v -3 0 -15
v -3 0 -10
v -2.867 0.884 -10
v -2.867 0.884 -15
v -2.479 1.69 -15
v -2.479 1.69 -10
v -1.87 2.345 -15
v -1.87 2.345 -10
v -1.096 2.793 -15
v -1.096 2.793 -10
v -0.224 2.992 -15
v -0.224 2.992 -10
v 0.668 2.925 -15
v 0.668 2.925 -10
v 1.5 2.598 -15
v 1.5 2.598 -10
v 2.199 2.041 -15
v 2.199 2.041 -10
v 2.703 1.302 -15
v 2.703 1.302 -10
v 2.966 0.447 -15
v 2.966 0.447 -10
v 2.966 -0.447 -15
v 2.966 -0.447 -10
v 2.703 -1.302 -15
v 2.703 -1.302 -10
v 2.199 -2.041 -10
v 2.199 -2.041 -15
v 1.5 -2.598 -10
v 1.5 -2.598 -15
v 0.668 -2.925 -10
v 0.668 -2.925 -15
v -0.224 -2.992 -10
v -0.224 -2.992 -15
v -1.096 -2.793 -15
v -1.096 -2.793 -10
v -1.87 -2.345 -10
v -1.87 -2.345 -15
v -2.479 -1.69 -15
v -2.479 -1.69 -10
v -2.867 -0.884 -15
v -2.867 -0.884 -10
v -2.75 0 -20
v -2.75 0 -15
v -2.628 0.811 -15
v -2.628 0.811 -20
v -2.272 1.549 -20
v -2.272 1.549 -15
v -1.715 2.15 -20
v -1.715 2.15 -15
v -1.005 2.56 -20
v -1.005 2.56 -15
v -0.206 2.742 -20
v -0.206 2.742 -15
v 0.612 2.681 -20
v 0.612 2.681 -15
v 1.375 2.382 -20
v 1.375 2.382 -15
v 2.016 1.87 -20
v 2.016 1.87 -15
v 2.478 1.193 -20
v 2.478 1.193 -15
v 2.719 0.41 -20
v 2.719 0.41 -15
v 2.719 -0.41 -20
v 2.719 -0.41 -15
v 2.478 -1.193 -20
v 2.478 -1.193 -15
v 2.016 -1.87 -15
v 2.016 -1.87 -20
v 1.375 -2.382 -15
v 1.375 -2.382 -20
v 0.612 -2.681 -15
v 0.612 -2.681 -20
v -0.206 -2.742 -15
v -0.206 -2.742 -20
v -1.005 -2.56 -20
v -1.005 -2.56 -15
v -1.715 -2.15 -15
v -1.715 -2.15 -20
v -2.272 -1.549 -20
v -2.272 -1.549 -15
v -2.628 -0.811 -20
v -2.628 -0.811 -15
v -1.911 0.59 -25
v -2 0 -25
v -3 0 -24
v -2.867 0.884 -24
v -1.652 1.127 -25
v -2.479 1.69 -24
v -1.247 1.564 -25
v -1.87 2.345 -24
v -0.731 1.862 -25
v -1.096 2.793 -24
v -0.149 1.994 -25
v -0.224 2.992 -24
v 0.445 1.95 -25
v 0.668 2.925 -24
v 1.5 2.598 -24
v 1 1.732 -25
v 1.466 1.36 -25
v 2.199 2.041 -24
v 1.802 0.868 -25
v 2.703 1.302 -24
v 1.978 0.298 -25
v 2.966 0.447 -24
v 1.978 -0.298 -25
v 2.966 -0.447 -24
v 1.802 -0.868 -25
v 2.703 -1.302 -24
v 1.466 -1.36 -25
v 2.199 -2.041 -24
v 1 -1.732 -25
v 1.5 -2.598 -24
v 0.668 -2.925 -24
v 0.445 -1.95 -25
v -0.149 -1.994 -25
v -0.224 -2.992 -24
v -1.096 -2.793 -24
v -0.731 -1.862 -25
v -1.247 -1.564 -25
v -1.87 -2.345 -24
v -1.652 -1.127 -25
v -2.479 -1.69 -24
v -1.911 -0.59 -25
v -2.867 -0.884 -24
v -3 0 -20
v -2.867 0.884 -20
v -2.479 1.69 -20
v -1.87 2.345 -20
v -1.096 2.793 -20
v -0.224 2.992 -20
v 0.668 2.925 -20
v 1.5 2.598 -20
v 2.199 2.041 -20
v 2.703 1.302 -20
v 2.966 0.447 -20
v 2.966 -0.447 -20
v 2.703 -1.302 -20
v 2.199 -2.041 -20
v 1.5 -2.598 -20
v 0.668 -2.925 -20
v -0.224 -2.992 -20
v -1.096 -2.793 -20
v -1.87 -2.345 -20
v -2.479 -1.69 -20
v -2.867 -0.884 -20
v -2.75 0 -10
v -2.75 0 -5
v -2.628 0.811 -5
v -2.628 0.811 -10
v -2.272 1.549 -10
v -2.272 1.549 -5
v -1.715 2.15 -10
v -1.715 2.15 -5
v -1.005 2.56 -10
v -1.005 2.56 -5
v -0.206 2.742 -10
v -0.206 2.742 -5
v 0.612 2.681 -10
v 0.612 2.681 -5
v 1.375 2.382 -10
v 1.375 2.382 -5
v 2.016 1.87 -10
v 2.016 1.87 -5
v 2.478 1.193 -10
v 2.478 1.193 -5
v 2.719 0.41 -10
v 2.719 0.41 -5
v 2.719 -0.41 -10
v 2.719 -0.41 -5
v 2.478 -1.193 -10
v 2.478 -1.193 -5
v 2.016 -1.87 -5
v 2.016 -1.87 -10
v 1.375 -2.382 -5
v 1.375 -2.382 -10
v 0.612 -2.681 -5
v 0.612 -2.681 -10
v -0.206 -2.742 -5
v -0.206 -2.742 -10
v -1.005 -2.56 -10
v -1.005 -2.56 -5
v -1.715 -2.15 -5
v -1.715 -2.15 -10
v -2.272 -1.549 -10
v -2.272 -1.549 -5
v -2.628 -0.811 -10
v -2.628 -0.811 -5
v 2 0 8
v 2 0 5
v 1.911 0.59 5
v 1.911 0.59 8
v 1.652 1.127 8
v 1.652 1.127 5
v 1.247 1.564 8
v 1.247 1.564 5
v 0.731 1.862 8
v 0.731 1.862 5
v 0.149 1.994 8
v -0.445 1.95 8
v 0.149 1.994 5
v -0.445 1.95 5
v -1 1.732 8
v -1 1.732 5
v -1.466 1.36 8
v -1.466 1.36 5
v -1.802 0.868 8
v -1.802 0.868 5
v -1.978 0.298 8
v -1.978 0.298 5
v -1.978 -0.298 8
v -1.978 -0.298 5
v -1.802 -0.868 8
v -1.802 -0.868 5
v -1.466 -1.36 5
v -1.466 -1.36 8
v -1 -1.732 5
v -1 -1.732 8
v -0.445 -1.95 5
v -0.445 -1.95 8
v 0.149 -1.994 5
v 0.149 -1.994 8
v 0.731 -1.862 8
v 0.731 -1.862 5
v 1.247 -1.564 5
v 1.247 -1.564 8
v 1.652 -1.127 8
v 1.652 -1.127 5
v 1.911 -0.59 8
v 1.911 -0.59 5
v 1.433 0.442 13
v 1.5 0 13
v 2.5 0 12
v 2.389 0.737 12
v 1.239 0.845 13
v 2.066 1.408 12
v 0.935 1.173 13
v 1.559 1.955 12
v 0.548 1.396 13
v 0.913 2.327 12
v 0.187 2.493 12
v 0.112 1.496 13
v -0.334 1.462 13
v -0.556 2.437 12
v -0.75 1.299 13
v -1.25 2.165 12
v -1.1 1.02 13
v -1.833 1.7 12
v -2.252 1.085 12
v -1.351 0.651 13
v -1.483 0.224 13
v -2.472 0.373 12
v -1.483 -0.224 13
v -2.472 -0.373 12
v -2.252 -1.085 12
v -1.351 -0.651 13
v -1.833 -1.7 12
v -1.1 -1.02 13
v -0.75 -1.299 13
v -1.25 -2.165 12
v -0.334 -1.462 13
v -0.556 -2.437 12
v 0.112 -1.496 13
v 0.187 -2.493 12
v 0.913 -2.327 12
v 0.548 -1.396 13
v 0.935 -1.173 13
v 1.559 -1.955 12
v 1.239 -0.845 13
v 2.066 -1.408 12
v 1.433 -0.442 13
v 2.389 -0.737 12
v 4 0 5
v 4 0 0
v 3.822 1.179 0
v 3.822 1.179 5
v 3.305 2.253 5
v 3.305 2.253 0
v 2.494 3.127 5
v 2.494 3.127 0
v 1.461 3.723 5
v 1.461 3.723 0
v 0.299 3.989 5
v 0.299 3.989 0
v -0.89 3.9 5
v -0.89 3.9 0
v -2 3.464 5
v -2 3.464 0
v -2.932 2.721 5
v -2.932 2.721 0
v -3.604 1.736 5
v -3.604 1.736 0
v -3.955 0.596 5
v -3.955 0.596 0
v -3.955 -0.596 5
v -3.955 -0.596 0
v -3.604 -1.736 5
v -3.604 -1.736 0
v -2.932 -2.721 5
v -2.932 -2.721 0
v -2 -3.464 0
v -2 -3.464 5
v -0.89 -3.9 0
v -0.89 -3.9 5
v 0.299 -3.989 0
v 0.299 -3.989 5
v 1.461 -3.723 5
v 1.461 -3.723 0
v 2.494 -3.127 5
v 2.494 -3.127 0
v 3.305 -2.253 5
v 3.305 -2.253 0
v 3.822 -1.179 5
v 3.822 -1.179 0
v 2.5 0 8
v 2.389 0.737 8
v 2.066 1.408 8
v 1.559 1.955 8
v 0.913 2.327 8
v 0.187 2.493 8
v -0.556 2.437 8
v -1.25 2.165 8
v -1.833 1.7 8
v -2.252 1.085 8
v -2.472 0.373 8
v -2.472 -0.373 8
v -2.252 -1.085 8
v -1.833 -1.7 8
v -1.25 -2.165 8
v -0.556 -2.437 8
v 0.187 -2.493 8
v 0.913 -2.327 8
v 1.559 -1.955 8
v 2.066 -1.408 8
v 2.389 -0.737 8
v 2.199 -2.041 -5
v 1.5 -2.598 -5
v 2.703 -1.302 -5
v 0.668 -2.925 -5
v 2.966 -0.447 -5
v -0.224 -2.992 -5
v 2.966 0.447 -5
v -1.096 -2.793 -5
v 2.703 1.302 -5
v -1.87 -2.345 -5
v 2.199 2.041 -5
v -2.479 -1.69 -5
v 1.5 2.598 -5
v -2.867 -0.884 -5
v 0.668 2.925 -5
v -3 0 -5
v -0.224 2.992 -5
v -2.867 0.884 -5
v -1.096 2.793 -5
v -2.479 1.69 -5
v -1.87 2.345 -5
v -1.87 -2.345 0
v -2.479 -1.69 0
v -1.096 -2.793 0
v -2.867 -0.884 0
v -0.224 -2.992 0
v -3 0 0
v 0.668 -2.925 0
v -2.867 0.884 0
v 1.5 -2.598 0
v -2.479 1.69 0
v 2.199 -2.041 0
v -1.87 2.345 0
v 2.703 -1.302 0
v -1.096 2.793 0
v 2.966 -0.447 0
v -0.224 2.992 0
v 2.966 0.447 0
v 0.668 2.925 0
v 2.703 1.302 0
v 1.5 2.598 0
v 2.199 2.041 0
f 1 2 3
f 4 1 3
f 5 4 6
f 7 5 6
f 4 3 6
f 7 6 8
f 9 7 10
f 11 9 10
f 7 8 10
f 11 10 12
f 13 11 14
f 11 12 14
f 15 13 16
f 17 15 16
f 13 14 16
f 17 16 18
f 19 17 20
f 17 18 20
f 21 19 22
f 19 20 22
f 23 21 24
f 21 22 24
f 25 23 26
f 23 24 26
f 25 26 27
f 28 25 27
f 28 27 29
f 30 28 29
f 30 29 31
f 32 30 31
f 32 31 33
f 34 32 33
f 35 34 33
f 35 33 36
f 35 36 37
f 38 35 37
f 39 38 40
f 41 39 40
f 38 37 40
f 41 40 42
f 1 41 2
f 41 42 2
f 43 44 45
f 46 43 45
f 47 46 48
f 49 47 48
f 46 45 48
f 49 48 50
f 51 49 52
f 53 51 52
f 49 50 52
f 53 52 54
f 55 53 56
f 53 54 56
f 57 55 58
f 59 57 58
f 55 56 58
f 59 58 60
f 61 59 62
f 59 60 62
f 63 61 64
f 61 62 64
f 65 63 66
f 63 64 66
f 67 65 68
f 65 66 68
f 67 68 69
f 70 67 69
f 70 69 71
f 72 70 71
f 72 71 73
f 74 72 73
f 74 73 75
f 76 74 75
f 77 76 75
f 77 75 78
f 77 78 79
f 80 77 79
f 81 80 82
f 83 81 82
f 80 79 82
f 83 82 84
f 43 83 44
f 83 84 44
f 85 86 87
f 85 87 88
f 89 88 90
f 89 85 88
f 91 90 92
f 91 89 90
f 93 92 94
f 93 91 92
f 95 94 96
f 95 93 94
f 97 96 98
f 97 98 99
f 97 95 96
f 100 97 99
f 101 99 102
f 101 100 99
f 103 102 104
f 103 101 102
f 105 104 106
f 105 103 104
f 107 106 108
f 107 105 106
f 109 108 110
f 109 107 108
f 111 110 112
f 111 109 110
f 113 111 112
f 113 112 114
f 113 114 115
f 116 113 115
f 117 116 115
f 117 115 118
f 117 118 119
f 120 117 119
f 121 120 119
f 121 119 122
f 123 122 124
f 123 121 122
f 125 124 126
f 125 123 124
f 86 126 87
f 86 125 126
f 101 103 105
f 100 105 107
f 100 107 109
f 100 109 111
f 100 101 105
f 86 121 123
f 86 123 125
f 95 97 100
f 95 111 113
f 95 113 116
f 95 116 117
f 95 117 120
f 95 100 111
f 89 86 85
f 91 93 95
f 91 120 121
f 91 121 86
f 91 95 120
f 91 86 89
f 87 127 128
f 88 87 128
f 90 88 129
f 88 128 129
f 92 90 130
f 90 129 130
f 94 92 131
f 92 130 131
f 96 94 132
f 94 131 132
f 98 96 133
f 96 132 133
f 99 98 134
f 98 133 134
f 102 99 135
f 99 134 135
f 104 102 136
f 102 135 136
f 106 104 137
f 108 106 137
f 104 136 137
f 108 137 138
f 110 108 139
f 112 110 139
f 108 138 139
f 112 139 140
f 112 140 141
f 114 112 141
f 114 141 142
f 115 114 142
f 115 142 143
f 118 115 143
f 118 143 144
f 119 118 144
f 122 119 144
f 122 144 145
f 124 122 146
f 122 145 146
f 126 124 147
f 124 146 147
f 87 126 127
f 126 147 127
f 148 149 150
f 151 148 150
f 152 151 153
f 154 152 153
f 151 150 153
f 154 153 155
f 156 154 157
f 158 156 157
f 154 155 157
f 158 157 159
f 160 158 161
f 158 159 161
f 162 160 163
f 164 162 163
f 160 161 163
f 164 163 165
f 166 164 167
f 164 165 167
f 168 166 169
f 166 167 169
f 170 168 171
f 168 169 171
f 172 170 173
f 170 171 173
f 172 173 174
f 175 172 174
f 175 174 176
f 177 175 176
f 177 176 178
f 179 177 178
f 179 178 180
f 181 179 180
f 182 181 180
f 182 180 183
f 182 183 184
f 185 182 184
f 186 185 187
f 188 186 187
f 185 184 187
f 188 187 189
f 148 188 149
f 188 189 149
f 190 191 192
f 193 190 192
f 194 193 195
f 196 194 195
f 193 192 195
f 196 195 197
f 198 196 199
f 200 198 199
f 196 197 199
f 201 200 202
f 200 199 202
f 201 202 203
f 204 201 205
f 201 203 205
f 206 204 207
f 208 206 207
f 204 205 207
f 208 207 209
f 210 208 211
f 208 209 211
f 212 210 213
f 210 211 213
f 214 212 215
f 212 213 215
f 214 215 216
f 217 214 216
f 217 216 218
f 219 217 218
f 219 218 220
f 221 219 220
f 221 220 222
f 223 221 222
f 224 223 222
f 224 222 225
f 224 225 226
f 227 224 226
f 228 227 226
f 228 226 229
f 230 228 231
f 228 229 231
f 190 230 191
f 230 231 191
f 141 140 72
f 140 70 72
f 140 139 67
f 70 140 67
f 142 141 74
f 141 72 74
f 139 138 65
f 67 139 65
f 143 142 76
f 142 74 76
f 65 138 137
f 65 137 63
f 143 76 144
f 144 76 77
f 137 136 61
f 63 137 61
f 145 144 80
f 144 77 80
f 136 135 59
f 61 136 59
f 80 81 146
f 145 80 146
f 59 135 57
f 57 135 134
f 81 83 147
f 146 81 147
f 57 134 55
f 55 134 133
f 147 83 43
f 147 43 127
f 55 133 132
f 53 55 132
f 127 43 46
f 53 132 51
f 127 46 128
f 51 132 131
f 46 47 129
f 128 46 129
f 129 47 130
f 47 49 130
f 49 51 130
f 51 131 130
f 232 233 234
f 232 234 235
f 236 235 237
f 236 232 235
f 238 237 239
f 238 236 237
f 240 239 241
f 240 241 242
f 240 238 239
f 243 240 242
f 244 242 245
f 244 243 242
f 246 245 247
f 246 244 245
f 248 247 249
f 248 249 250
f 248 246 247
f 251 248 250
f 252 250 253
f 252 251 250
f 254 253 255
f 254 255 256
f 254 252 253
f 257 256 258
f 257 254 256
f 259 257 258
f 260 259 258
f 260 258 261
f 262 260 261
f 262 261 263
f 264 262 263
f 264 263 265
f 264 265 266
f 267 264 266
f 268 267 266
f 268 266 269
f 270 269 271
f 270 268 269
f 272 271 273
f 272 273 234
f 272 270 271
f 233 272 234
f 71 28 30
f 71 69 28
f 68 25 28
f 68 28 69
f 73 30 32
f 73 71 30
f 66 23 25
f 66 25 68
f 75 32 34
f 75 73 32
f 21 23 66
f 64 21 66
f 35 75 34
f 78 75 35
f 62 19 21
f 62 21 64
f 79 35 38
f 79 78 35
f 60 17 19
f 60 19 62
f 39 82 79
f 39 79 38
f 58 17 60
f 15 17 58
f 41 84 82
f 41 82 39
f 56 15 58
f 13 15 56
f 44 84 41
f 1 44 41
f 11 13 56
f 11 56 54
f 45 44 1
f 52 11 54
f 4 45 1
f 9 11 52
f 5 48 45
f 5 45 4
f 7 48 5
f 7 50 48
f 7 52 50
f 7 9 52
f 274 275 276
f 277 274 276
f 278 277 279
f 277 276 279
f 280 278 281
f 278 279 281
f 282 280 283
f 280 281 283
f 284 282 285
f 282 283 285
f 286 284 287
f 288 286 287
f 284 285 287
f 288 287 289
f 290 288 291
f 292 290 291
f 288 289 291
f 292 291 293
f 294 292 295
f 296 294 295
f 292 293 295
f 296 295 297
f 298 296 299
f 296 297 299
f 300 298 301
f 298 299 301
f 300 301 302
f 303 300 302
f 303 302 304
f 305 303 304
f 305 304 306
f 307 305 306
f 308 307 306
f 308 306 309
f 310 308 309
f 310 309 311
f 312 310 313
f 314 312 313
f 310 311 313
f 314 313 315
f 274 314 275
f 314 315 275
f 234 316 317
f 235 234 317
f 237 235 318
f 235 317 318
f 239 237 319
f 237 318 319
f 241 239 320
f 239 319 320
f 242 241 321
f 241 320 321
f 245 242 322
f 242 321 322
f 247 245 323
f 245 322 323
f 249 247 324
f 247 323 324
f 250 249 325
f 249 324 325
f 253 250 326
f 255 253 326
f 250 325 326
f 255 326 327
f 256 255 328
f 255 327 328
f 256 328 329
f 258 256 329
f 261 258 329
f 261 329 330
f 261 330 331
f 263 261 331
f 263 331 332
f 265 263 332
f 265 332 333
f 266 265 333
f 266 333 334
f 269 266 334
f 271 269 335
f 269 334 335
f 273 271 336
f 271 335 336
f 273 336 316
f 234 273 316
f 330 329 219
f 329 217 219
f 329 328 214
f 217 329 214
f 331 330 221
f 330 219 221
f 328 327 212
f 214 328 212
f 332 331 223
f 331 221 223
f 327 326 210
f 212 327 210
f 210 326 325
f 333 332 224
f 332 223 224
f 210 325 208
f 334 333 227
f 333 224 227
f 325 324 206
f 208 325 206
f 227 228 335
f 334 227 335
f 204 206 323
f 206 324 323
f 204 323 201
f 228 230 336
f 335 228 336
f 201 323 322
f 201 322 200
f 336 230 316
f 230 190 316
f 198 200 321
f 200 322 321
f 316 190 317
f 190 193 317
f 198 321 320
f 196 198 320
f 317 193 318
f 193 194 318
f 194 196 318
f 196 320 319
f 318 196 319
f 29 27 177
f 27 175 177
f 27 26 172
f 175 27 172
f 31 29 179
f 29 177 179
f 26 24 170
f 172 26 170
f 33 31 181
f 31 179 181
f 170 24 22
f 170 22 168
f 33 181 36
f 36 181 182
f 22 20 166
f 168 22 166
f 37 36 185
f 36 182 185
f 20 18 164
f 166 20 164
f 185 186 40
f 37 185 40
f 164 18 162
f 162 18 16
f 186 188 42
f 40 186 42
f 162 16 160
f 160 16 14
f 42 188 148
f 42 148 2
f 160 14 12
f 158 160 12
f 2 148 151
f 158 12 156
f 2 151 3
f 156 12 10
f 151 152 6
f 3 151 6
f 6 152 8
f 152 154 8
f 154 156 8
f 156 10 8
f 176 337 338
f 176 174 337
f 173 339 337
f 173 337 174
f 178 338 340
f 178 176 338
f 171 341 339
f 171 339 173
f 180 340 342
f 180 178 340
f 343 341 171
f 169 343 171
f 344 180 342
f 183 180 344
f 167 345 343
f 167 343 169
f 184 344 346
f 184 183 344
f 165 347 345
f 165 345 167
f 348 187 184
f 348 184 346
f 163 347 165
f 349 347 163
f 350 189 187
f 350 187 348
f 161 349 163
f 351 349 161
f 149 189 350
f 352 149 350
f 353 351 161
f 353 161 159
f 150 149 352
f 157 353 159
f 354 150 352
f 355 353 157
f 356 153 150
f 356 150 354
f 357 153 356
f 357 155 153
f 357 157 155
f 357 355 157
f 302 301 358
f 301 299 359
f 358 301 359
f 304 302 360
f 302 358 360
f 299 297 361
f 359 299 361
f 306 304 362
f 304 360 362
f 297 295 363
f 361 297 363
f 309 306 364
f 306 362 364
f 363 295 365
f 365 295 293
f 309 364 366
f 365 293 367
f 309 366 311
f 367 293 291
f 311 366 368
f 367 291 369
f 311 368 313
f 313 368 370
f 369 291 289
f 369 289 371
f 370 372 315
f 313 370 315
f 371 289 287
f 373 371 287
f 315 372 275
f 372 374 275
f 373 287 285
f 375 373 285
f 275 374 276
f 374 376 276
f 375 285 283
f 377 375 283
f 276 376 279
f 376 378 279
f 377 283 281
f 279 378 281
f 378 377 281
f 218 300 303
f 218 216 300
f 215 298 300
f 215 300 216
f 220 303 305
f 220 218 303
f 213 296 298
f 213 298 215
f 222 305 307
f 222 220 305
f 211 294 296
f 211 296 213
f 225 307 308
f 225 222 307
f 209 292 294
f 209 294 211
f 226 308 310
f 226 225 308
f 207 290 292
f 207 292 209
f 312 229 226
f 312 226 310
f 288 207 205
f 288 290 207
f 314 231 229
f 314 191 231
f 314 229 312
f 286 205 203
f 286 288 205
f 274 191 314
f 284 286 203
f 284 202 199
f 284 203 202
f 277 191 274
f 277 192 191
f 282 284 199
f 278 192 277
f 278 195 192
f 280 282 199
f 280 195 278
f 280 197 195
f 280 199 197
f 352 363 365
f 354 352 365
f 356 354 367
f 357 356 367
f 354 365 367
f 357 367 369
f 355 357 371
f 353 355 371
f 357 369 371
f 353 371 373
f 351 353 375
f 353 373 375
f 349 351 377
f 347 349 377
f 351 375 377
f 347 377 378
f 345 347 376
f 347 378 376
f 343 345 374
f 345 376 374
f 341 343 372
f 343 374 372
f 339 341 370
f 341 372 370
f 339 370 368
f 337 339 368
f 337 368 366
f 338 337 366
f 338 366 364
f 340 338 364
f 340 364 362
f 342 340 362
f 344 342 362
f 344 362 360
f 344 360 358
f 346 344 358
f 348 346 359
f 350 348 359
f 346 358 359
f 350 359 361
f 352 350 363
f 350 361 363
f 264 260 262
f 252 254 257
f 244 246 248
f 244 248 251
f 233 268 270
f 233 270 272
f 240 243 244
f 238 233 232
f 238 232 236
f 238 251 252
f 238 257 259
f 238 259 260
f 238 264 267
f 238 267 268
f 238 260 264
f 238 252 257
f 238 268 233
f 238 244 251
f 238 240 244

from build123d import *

# Parameters (mm, degrees)
ESQUISSE1_R         = 4
BOSS_EXTRU_1_DEPTH  = 5
ESQUISSE5_R         = 3
BOSS_EXTRU_5_DEPTH  = 5
ESQUISSE6_R         = 2.75
BOSS_EXTRU_6_DEPTH  = 5
ESQUISSE7_R         = 3
BOSS_EXTRU_7_DEPTH  = 5
ESQUISSE8_R         = 2.75
BOSS_EXTRU_8_DEPTH  = 5
ESQUISSE9_R         = 3
BOSS_EXTRU_9_DEPTH  = 5
CHANFREIN1_SIZE     = 1
ESQUISSE10_R        = 2
BOSS_EXTRU_10_DEPTH = 3
ESQUISSE11_R        = 2.5
BOSS_EXTRU_11_DEPTH = 5
CHANFREIN2_SIZE     = 1


with BuildPart() as part:
    # Esquisse1 → Boss.-Extru.1 (new body)
    with BuildSketch(Plane.XY):
        Circle(ESQUISSE1_R)
    extrude(amount=BOSS_EXTRU_1_DEPTH)

    # Esquisse5 → Boss.-Extru.5 (add)
    with BuildSketch(Plane(origin=(0, 0, 0), x_dir=(-1, 0, 0), z_dir=(0, 0, -1))):
        Circle(ESQUISSE5_R)
    extrude(amount=BOSS_EXTRU_5_DEPTH)

    # Esquisse6 → Boss.-Extru.6 (add)
    with BuildSketch(Plane(origin=(0, 0, -5), x_dir=(-1, 0, 0), z_dir=(0, 0, -1))):
        Circle(ESQUISSE6_R)
    extrude(amount=BOSS_EXTRU_6_DEPTH)

    # Esquisse7 → Boss.-Extru.7 (add)
    with BuildSketch(Plane(origin=(0, 0, -10), x_dir=(-1, 0, 0), z_dir=(0, 0, -1))):
        Circle(ESQUISSE7_R)
    extrude(amount=BOSS_EXTRU_7_DEPTH)

    # Esquisse8 → Boss.-Extru.8 (add)
    with BuildSketch(Plane(origin=(0, 0, -15), x_dir=(-1, 0, 0), z_dir=(0, 0, -1))):
        Circle(ESQUISSE8_R)
    extrude(amount=BOSS_EXTRU_8_DEPTH)

    # Esquisse9 → Boss.-Extru.9 (add)
    with BuildSketch(Plane(origin=(0, 0, -20), x_dir=(-1, 0, 0), z_dir=(0, 0, -1))):
        Circle(ESQUISSE9_R)
    extrude(amount=BOSS_EXTRU_9_DEPTH)

    # Chanfrein1
    chanfrein1_edges = [part.edges().sort_by_distance(p)[0] for p in [
        (3, 0, -25),
    ]]
    chamfer(chanfrein1_edges, length=CHANFREIN1_SIZE)

    # Esquisse10 → Boss.-Extru.10 (add)
    with BuildSketch(Plane.XY.offset(5)):
        Circle(ESQUISSE10_R)
    extrude(amount=BOSS_EXTRU_10_DEPTH)

    # Esquisse11 → Boss.-Extru.11 (add)
    with BuildSketch(Plane.XY.offset(8)):
        Circle(ESQUISSE11_R)
    extrude(amount=BOSS_EXTRU_11_DEPTH)

    # Chanfrein2
    chanfrein2_edges = [part.edges().sort_by_distance(p)[0] for p in [
        (-2.5, 0, 13),
    ]]
    chamfer(chanfrein2_edges, length=CHANFREIN2_SIZE)


solid = part.part
